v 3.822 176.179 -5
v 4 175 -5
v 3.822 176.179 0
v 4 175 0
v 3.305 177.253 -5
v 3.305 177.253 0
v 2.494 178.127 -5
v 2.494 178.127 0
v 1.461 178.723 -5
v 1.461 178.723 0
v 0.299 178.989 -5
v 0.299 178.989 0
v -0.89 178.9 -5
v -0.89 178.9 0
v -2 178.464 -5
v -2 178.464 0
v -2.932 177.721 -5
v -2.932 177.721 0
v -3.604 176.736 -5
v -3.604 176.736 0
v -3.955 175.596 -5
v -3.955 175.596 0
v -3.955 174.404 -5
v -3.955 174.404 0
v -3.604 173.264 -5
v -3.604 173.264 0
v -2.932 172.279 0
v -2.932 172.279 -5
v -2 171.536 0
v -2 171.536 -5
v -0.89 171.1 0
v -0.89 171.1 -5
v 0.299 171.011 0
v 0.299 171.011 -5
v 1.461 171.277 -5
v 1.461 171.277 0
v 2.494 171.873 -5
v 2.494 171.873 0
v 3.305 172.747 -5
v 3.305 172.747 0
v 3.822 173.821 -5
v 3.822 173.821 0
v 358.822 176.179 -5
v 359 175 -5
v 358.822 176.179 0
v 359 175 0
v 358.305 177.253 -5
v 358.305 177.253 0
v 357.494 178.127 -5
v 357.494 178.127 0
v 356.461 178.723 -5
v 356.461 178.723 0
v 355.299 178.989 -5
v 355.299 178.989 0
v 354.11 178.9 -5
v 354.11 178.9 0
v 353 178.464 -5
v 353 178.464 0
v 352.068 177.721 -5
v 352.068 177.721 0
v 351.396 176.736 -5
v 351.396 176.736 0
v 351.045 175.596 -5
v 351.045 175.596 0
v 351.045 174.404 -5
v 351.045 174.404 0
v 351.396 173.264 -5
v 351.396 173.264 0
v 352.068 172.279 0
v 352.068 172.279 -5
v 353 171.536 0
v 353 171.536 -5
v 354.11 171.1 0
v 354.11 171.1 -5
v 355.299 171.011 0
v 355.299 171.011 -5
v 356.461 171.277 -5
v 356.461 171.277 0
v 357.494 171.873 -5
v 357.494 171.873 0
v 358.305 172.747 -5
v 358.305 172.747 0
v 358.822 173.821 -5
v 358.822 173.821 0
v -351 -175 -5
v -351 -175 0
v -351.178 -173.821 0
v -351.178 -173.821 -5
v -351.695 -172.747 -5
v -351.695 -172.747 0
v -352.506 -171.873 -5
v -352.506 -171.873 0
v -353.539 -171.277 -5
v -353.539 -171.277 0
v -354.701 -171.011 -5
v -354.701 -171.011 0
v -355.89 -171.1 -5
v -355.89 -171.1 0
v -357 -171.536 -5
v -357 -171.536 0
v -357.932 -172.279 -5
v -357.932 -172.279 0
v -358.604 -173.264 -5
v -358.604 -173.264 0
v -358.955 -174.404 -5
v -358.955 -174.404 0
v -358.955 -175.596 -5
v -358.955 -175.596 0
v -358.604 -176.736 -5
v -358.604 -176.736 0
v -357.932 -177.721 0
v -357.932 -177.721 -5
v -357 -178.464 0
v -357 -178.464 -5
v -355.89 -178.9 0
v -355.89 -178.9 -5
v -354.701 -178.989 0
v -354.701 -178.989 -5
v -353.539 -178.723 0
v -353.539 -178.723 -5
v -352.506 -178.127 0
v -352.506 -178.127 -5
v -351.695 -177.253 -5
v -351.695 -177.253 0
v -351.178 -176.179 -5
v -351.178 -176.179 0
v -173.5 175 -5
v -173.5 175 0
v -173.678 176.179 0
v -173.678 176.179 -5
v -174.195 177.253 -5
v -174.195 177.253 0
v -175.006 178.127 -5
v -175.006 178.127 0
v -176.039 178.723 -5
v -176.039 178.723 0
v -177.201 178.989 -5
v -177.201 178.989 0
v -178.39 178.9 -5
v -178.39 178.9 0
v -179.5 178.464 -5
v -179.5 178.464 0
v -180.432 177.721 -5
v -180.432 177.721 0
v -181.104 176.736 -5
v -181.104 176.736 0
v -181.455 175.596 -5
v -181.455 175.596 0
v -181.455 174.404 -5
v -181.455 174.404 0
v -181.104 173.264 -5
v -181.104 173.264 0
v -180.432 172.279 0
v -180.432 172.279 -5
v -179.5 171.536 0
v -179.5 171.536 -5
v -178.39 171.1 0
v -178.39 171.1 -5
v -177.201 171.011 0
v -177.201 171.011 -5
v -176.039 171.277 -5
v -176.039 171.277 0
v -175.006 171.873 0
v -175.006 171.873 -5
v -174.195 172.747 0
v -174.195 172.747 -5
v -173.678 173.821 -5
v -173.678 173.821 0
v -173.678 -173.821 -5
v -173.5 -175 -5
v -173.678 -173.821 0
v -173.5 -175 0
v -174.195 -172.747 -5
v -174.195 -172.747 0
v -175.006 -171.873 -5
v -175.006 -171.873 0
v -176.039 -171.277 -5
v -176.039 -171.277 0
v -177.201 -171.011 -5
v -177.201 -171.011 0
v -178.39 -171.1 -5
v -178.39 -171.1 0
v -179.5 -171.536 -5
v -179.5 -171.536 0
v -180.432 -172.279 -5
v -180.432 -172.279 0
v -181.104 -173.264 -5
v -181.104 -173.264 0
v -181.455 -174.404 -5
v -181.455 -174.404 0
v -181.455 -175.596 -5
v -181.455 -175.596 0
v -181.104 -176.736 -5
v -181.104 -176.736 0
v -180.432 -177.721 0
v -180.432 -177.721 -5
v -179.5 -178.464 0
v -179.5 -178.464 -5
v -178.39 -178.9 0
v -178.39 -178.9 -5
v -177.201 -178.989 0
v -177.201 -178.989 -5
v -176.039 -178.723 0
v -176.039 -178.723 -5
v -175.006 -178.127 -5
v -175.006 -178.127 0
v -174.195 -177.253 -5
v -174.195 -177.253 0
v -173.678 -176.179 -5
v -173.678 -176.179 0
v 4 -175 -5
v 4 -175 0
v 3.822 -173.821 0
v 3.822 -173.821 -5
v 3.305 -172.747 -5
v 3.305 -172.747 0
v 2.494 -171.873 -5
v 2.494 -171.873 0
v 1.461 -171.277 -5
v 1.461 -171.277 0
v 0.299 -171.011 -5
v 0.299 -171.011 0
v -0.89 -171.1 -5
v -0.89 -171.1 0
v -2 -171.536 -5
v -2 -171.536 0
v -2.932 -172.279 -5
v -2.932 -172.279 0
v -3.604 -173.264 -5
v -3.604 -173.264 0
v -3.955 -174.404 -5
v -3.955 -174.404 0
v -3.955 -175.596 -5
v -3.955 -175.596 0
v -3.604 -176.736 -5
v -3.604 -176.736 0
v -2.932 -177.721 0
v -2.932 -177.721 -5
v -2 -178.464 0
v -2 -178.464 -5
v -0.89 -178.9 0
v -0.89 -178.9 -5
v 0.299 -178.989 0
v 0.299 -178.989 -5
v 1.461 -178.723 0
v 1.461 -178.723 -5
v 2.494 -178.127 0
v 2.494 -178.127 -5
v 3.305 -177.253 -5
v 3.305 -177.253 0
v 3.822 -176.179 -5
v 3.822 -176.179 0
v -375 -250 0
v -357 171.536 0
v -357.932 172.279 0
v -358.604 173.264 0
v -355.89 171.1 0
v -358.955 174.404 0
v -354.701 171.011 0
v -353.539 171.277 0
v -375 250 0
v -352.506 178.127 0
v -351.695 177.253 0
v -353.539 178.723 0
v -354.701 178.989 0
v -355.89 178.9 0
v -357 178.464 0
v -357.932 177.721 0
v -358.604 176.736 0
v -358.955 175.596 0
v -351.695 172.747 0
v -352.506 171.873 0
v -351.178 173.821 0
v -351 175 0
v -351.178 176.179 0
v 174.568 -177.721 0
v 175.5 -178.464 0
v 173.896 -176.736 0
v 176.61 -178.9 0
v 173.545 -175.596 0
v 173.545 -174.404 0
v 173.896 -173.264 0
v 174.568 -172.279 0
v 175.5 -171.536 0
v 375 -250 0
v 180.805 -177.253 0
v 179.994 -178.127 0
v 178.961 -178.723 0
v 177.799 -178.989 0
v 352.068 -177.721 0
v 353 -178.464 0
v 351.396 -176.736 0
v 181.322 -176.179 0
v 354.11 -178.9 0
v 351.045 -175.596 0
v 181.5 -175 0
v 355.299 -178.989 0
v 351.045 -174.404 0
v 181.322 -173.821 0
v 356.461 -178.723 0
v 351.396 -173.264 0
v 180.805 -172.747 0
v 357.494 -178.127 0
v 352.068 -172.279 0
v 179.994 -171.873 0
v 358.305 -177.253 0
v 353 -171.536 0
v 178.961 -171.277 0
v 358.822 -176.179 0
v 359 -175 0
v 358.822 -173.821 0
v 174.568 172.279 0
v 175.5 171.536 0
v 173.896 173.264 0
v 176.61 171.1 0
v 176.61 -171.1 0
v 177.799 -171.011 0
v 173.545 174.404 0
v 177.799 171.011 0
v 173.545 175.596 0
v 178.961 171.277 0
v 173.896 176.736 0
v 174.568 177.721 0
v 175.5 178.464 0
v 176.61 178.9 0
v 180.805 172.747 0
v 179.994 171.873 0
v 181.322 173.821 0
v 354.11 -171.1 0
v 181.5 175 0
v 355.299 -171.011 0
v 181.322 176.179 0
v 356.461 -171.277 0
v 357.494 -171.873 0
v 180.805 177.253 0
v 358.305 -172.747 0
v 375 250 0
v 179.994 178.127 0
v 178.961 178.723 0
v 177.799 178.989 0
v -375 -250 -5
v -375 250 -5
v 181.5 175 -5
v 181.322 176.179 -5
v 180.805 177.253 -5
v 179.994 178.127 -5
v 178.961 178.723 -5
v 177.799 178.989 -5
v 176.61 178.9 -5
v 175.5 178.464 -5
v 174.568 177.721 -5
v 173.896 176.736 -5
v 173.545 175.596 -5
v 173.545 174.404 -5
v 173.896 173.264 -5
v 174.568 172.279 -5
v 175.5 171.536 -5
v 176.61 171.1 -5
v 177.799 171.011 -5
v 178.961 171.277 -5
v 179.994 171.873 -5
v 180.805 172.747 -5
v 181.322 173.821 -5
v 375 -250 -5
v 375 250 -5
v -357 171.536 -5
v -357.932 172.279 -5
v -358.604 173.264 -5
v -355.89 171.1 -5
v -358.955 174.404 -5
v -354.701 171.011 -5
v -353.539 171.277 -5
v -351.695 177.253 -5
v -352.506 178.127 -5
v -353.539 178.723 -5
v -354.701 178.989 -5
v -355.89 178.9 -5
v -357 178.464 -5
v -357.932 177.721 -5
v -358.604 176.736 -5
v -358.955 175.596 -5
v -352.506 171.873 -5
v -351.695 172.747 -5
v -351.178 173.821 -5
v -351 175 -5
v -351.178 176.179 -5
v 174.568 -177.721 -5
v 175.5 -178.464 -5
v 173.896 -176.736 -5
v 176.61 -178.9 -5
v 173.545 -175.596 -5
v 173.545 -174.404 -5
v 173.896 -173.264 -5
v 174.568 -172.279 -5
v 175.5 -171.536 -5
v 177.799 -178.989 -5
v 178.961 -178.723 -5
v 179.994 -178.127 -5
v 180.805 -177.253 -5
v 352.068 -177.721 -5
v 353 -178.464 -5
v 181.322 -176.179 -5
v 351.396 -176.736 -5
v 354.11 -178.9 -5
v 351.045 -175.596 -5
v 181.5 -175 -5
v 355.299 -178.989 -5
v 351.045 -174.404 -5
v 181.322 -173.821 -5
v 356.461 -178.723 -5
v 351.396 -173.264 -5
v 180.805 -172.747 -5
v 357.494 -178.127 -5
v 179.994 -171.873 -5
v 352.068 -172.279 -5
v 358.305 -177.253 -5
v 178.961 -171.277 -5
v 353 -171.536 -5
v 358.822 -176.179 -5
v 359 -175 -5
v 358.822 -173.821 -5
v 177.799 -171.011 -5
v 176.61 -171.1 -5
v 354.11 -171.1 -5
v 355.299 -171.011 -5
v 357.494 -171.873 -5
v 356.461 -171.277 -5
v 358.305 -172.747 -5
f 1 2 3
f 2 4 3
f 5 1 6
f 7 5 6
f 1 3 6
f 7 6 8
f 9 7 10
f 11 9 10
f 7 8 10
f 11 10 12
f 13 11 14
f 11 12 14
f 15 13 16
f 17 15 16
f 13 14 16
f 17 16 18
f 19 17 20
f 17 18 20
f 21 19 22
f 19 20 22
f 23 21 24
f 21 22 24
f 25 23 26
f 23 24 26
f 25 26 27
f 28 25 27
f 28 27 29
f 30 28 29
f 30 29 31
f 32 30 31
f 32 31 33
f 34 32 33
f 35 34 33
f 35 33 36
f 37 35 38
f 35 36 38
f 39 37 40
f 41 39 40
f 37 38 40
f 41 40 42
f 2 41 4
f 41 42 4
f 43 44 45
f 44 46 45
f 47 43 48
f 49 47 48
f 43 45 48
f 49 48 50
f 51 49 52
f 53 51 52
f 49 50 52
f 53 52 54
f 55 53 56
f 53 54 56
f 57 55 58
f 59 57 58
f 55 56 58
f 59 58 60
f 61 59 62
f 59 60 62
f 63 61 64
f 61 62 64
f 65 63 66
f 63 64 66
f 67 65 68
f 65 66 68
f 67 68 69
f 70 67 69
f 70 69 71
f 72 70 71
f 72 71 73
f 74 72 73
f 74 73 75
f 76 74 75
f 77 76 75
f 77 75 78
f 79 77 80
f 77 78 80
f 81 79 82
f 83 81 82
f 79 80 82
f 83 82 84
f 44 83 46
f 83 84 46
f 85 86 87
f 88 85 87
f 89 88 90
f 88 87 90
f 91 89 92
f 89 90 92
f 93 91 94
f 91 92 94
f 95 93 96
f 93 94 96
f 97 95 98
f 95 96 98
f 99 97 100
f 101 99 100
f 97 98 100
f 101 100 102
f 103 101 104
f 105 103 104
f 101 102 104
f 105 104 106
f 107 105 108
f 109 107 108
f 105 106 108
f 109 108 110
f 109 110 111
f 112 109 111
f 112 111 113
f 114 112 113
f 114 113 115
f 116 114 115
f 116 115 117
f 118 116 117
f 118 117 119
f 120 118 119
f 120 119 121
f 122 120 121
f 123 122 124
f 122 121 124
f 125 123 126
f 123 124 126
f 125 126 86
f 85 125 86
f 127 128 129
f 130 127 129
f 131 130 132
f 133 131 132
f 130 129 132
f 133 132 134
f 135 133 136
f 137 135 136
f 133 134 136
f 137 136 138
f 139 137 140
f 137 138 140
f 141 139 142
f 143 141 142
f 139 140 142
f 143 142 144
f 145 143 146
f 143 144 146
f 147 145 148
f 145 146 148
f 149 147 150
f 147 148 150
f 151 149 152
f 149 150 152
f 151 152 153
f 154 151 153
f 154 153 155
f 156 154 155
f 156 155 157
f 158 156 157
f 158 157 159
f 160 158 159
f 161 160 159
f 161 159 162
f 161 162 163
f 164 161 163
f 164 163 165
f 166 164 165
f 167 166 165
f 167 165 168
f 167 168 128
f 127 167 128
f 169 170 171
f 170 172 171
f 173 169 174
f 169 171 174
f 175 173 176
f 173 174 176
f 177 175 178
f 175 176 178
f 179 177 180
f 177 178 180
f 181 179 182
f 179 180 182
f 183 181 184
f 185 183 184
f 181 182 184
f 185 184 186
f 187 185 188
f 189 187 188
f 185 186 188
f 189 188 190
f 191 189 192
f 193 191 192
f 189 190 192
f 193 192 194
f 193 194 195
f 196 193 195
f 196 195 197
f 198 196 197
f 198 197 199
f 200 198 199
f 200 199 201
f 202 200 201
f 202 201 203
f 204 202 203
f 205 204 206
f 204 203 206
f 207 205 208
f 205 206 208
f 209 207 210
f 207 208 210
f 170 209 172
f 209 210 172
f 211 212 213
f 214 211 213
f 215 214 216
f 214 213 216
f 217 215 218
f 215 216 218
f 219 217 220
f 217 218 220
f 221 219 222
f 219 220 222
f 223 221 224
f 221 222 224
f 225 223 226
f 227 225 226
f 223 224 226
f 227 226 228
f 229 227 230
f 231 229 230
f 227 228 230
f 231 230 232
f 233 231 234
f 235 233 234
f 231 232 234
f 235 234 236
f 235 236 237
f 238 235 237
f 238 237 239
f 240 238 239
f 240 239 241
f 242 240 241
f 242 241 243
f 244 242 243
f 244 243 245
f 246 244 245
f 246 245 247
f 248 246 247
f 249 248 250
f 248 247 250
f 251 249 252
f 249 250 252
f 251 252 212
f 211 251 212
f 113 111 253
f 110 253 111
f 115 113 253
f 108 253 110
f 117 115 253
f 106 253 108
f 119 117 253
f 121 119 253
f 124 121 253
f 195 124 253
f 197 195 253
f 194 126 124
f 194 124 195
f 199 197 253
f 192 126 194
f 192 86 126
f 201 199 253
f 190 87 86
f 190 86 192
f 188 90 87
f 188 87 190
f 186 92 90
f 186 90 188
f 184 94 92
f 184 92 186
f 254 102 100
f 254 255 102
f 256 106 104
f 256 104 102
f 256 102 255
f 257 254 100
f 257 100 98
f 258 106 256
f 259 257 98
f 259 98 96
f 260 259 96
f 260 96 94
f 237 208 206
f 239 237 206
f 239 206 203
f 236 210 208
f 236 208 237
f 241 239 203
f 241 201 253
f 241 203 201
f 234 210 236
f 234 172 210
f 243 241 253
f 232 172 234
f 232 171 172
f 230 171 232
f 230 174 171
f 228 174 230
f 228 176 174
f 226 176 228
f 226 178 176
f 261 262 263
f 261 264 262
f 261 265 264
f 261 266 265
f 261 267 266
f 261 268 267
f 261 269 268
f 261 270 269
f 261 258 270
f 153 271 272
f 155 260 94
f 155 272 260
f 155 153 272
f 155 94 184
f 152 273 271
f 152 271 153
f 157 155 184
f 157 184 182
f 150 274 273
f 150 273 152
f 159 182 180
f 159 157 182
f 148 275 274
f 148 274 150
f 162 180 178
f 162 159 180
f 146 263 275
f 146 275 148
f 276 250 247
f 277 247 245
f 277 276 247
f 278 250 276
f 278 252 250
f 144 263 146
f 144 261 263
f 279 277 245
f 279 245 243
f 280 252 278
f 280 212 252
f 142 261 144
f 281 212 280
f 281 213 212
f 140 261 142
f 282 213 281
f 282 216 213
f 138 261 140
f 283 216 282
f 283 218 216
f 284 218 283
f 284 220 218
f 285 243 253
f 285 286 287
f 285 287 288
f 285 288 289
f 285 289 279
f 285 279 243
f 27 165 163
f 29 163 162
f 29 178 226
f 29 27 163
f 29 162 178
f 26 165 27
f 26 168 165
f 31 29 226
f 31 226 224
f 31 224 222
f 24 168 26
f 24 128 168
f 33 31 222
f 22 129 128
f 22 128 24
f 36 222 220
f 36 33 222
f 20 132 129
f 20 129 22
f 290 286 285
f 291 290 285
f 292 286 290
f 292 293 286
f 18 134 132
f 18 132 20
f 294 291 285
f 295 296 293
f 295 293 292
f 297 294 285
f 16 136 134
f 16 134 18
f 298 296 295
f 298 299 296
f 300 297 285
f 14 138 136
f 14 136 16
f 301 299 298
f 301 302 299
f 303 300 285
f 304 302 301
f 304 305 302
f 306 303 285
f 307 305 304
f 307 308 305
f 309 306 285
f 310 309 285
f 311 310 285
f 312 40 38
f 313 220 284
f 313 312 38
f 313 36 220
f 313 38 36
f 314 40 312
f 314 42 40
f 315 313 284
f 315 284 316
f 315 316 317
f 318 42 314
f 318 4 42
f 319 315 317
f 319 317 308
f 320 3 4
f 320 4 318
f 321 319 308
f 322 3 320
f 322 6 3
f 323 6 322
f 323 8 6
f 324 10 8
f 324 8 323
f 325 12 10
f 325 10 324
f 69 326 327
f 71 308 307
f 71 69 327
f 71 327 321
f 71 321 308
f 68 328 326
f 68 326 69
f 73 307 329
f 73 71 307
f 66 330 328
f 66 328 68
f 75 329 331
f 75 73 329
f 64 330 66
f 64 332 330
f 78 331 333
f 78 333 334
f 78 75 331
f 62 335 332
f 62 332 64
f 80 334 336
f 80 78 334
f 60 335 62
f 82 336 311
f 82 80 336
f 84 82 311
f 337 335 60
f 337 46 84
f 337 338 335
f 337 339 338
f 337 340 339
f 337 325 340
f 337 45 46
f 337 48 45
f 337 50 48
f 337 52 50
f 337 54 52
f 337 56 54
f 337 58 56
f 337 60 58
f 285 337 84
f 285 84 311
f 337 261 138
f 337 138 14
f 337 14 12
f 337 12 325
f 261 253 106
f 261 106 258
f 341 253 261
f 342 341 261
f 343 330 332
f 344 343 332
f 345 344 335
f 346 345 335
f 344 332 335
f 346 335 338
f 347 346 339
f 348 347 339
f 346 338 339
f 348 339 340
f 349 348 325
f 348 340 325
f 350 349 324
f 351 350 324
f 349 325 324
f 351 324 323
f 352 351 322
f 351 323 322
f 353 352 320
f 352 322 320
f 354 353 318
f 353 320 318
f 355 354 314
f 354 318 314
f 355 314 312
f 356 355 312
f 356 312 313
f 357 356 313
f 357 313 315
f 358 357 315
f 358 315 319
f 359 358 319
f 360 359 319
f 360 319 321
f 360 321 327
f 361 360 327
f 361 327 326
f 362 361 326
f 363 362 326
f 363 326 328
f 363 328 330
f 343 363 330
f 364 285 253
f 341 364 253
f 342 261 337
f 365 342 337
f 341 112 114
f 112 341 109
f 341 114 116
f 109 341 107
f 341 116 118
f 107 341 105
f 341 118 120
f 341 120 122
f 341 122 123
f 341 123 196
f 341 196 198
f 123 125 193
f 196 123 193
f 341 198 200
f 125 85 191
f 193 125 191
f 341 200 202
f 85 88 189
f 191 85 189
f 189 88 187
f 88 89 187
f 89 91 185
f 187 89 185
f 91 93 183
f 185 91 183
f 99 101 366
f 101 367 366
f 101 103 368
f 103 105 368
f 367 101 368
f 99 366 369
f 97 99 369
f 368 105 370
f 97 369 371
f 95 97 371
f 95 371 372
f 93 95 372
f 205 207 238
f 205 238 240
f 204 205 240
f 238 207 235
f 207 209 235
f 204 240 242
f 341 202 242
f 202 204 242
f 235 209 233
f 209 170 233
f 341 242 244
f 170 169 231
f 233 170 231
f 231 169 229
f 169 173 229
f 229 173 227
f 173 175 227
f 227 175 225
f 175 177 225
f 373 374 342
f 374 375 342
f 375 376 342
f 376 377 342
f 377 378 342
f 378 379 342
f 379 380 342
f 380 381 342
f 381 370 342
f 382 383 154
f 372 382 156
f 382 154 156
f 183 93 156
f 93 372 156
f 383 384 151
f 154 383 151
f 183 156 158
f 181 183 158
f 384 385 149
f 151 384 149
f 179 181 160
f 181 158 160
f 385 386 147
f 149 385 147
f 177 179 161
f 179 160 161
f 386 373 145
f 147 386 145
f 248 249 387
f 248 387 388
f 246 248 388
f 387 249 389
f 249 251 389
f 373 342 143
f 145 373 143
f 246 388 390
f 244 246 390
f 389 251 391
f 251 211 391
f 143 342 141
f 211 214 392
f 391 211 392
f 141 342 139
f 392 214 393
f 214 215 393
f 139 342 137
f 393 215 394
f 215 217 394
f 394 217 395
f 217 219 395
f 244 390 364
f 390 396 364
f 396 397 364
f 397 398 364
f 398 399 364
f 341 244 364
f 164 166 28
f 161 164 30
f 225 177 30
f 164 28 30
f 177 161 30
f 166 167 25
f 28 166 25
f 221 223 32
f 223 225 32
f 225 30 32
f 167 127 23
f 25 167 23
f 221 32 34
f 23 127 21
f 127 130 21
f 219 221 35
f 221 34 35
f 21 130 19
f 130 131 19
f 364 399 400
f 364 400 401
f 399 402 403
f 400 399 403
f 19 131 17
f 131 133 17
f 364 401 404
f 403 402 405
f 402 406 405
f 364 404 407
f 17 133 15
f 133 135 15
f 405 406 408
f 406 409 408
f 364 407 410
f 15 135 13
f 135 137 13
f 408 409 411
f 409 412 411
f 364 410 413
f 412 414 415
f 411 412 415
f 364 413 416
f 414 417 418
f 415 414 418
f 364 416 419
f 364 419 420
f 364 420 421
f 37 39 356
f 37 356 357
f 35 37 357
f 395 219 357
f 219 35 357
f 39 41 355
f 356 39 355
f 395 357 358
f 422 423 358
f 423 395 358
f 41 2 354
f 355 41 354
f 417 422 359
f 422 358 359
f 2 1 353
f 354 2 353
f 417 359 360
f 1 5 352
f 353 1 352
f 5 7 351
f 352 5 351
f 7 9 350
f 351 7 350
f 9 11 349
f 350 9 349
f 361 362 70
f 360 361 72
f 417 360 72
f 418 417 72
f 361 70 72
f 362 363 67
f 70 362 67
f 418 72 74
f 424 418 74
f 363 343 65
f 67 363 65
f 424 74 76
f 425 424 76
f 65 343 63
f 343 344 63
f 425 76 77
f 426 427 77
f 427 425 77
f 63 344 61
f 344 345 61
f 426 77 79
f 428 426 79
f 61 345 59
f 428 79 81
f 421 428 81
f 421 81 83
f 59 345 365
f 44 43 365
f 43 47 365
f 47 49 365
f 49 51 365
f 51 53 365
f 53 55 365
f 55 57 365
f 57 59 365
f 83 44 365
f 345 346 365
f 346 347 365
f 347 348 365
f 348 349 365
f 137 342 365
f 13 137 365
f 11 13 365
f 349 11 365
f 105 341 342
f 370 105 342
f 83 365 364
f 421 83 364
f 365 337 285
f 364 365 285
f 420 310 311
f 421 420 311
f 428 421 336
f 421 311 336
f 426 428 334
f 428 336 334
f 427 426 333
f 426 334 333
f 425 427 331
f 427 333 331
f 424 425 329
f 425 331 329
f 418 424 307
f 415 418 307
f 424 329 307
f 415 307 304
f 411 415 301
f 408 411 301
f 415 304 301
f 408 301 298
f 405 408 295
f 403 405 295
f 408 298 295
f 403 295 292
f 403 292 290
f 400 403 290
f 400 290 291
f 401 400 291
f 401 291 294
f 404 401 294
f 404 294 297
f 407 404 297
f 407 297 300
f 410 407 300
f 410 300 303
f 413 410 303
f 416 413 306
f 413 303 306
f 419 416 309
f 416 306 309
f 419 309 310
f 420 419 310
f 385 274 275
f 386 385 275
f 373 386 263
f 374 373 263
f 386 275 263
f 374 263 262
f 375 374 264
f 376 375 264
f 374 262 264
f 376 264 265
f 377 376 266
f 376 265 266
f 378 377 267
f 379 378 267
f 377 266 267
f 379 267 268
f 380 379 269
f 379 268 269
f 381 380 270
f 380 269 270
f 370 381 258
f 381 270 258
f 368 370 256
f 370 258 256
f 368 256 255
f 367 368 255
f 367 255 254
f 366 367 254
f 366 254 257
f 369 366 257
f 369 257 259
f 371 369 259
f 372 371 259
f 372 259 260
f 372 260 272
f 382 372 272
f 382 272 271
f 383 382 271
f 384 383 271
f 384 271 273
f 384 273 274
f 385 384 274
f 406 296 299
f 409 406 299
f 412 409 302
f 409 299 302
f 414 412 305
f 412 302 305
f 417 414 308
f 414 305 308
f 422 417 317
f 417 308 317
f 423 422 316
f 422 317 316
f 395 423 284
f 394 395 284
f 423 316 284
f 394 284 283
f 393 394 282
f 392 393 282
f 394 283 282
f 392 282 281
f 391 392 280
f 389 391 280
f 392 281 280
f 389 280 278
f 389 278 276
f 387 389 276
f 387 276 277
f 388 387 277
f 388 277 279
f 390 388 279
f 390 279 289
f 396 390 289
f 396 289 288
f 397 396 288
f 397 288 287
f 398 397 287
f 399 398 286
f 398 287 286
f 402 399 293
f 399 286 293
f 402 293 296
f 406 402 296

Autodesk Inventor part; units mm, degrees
ref_plane "YZ Plane" through (0, 0, 0) normal (1, 0, 0) x (0, 1, 0)
ref_plane "XZ Plane" through (0, 0, 0) normal (0, 1, 0) x (-1, 0, 0)
ref_plane "XY Plane" through (0, 0, 0) normal (0, 0, 1) x (1, 0, 0)
sketch "base_layout_sketch" plane through (0, 0, 0) normal (0, 0, 1) x (1, 0, 0)
  line L0 (-375, 200) -> (375, 200)
  line L1 (375, 200) -> (375, -200)
  line L2 (375, -200) -> (-375, -200)
  line L3 (-375, -200) -> (-375, 200)
  line L4 (0, 200) -> (0, -200) construction
  line L5 (-375, 150) -> (375, 150)
  line L6 (375, 150) -> (375, -150)
  line L7 (375, -150) -> (-375, -150)
  line L8 (-375, -150) -> (-375, 150)
  line L9 (0, 150) -> (0, -150) construction
  line L10 (-375, 250) -> (375, 250)
  line L11 (375, 250) -> (375, -250)
  line L12 (375, -250) -> (-375, -250)
  line L13 (-375, -250) -> (-375, 250)
  line L14 (0, 250) -> (0, -250) construction
  point P0 (0, 0)
  point P1 (0, 0)
  point P2 (-375, 200)
  point P3 (-375, -200)
  point P4 (375, -200)
  point P5 (375, 200)
  dimension "d0" = 400
  dimension "d1" = 750
  dimension "d2" = 300
  dimension "d4" = 500
sketch "bolt_holes_sketch" plane through (0, 0, 0) normal (0, 0, 1) x (1, 0, 0)
  circle A0 centre (-355, 175) radius 4
  line L0 (-375, 250) -> (375, 250) projected
  line L1 (-375, -250) -> (-375, 250) projected
  line L2 (-560, 0) -> (560, 0) projected
  point P0 (0, 0)
  dimension "d3" = 8
  dimension "d6" = 20
  dimension "d21" = 175
extrude "sheet_visualisation" add sketch "base_layout_sketch" against normal blind 5
extrude "bolt_holes Cut" cut sketch "bolt_holes_sketch" against normal through all
pattern_linear "bolt_holes_upper Pattern" count 5 spacing 177.5 along (1, 0, 0) of "bolt_holes Cut"
mirror "bolt_holes Mirror" about plane through (0, 0, 0) normal (0, 1, 0) of "bolt_holes Cut", "bolt_holes_upper Pattern"
equation "\"d0\" = layer_width"
equation "\"d1\" = track_length"
equation "\"d2\" = track_width"
equation "\"d4\" = real_sheet_width"
equation "\"d3\" = bolt_diameter"
equation "\"d6\" = x_offset_for_bolts"
equation "\"d21\" = y_offset_for_bolts"
equation "\"d14\" = sheet_thickness"
equation "\"track_length\" = 750"
equation "\"layer_width\" = 400"
equation "\"bolt_diameter\" = 8"
equation "\"real_sheet_width\" = 500"
equation "\"x_offset_for_bolts\" = 20"
equation "\"y_offset_for_bolts\" = 175"
equation "\"sheet_thickness\" = 5"
equation "\"track_width\" = 300"
equation "\"ferrite_length\" = 109"
equation "\"ferrite_width\" = 15"
equation "\"ferrite_height\" = 8"
equation "\"edge_gap_distance\" = 14.5"
equation "\"wire_diameter\" = 4.5"
equation "\"distance_between_wires\" = -1.2 * wire_diameter + 0.2 * parameter_6"
equation "\"distance_between_wires_edge\" = -1.5 * wire_diameter + 0.5 * parameter_2"
equation "\"bend_radius_inner\" = 15"
equation "\"wall_thickness\" = 25"
equation "\"parameter_6\" = 120"
equation "\"parameter_2\" = 30"
properties part number "bolt_holes_for_all"
